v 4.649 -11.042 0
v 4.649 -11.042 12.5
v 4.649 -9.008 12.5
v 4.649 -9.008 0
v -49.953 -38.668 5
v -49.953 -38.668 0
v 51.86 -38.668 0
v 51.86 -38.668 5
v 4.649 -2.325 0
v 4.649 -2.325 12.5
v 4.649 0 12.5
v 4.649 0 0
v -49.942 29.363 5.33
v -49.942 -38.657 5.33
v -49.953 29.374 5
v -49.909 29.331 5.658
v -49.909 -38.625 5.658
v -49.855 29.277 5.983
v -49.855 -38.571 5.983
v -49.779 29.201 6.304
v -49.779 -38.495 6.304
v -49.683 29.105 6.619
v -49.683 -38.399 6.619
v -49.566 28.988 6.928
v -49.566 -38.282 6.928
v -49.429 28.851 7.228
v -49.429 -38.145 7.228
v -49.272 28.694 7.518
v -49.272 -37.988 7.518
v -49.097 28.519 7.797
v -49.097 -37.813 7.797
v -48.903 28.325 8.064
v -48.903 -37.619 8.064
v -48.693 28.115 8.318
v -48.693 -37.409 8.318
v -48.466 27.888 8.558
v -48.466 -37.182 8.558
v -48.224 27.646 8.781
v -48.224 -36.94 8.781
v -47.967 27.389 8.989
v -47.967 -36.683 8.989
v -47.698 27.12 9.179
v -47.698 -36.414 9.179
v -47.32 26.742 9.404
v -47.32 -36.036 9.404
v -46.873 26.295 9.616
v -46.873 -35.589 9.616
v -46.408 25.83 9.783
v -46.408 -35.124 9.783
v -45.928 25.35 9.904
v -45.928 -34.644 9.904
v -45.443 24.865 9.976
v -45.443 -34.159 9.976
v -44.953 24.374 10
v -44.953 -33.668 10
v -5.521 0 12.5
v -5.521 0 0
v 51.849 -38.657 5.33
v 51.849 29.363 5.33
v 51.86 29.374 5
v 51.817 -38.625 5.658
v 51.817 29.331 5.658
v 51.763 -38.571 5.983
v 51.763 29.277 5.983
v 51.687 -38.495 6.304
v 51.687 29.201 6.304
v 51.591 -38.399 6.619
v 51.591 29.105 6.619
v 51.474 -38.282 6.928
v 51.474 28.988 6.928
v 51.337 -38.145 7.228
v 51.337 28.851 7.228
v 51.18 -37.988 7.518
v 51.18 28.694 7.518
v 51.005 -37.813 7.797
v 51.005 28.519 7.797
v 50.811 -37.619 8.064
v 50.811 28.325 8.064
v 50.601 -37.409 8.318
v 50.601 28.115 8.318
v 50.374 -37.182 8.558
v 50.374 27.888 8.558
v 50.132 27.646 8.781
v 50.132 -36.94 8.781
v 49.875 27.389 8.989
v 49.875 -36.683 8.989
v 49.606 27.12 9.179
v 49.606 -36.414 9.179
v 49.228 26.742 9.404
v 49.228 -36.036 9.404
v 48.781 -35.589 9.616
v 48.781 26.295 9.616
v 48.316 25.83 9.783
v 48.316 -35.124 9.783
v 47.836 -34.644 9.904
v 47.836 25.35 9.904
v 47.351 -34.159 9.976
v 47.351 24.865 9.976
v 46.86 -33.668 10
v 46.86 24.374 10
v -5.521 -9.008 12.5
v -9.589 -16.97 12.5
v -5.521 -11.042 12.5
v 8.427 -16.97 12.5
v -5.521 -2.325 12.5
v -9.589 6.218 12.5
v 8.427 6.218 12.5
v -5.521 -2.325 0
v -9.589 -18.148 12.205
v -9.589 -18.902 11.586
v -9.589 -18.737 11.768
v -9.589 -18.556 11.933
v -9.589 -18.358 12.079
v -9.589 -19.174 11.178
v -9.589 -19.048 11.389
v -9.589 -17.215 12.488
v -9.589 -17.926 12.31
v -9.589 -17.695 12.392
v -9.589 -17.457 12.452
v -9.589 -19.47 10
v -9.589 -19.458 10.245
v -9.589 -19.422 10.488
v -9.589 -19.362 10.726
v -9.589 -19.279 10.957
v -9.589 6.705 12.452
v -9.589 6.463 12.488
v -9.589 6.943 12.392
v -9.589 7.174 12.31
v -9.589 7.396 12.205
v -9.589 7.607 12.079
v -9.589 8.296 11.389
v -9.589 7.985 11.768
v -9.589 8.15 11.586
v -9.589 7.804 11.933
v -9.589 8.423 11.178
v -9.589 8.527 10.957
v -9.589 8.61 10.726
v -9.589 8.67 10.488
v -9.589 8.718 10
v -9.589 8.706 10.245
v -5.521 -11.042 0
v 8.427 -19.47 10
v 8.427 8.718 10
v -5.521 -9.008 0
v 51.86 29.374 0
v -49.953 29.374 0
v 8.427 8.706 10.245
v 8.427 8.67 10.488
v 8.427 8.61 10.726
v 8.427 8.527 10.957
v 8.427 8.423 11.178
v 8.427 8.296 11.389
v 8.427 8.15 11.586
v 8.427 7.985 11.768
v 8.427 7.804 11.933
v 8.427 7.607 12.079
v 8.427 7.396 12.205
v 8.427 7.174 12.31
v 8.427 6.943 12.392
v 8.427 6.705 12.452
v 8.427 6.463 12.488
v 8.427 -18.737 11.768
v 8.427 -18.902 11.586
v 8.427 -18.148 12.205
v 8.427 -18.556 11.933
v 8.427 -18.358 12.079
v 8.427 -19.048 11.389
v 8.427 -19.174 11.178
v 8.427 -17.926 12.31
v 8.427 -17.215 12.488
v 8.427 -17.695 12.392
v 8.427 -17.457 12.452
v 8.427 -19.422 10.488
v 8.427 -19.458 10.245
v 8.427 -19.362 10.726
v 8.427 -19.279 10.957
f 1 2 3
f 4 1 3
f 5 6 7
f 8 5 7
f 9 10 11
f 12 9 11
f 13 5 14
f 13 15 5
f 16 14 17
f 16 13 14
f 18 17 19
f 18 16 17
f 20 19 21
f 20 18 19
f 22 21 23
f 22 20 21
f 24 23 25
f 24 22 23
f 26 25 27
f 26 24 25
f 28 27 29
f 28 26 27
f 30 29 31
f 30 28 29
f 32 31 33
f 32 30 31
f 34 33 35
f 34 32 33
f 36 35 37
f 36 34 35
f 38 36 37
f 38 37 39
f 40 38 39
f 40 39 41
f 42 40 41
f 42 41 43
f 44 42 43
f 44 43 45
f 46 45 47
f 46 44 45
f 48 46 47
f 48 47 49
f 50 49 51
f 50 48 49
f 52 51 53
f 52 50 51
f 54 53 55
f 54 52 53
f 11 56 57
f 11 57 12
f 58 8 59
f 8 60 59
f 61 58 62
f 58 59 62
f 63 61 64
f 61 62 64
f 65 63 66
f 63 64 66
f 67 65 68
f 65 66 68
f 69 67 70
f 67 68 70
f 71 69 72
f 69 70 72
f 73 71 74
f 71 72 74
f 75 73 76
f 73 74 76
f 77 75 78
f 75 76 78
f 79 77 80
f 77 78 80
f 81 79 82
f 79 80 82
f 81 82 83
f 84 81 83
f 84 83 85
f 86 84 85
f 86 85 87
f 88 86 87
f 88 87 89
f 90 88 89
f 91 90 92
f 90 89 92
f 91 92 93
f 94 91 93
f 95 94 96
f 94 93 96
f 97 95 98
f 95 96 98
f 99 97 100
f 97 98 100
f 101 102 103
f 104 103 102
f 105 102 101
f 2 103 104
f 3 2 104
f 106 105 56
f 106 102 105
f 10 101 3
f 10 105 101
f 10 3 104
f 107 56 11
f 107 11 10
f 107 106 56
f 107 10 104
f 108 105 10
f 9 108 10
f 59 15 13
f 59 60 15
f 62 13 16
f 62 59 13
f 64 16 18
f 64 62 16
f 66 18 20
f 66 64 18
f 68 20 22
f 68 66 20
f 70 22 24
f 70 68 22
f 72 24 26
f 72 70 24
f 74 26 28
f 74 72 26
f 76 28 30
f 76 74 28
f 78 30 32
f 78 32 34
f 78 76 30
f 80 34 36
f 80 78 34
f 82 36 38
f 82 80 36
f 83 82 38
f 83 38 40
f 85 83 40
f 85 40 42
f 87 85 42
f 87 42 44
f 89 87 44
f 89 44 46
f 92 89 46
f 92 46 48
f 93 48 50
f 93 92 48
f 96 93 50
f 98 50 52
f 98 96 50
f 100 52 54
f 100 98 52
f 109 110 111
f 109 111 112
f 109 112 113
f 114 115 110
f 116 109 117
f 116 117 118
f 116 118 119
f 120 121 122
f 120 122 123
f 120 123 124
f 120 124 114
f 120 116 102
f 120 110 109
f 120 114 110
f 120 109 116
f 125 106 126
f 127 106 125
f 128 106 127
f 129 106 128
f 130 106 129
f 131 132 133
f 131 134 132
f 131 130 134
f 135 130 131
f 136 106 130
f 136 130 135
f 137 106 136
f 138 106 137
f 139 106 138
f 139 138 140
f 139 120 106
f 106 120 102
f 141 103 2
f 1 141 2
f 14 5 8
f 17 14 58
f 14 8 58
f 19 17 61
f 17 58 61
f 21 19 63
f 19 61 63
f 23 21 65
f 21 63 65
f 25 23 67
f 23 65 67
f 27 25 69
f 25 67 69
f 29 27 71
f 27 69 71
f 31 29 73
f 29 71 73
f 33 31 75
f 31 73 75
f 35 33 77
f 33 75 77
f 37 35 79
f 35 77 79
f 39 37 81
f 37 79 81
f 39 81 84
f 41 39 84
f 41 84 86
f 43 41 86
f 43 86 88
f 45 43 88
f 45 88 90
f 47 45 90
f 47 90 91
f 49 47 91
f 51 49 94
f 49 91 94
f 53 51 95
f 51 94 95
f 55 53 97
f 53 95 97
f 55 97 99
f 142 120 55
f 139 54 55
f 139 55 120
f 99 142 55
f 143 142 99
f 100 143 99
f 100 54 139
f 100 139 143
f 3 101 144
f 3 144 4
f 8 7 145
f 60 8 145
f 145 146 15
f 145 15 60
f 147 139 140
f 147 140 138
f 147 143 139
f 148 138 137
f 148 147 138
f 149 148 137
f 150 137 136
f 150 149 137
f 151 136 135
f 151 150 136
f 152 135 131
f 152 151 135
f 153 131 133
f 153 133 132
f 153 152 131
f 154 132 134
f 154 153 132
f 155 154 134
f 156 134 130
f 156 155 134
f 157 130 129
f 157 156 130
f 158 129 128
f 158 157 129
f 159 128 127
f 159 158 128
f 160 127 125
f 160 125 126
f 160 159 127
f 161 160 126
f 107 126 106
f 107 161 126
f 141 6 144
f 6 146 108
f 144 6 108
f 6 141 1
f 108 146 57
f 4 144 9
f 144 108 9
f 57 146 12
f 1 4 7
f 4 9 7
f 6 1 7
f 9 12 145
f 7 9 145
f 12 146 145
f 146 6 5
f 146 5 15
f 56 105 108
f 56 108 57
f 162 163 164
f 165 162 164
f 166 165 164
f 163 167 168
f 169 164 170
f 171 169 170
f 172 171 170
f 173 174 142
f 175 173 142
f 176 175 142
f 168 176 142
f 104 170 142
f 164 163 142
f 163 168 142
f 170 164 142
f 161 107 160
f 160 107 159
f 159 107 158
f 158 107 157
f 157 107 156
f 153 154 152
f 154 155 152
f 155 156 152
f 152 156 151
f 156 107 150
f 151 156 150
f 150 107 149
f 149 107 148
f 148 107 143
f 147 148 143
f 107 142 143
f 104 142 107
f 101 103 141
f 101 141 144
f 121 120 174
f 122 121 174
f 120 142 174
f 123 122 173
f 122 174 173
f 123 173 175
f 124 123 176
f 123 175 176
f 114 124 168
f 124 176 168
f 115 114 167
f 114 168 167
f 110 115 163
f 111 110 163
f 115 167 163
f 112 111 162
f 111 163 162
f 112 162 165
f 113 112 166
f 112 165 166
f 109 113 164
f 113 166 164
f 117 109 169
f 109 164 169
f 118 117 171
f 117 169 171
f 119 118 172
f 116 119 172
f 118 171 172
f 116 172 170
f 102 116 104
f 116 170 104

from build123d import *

# Parameters (mm, degrees)
F0_W     = 101.8128246069
F0_H     = 68.0426731706
F1_DEPTH = 10
F2_R     = 5
F3_W     = 18.016605638
F3_H     = 28.1872702762
F4_DEPTH = 2.5
F5_W     = 10.1706655696
F5_H     = 2.0341333002
F5_H_2   = 2.3247234058
F6_DEPTH = 25
F7_R     = 2.49999


# Not quite as in the source:
# - a fillet or chamfer is up to 0.001 mm smaller than in the source, because OpenCascade refuses the exact size


with BuildPart() as f1:
    # F0 (on Top) → F1 (new body)
    with BuildSketch(Plane.XY):
        with Locations((0.9539090097, -4.6469829977)):
            Rectangle(F0_W, F0_H)
    extrude(amount=F1_DEPTH)

    # F2
    f2_edges = [f1.edges().sort_by_distance(p)[0] for p in [
        (-49.952503, -4.646983, 10),
        (0.953909, 29.374354, 10),
        (0.953909, -38.66832, 10),
        (51.860321, -4.646983, 10),
    ]]
    fillet(f2_edges, radius=F2_R)

    # F3 (on face) → F4 (join)
    with BuildSketch(Plane.XY.offset(10)):
        with Locations((-0.5811811425, -5.3759221919)):
            Rectangle(F3_W, F3_H)
    extrude(amount=F4_DEPTH)

    # F5 (on face) → F6 (cut)
    with BuildSketch(Plane.XY.offset(12.5)):
        with Locations((-0.435885042, -10.0253690034)):
            Rectangle(F5_W, F5_H)
        with Locations((-0.435885042, -1.1623617029)):
            Rectangle(F5_W, F5_H_2)
    extrude(amount=-F6_DEPTH, mode=Mode.SUBTRACT)

    # F7 (radius 2.5 in the source; OpenCascade refuses exactly that, so slightly less here)
    f7_edges = [f1.edges().sort_by_distance(p)[0] for p in [
        (-0.581181, -19.469557, 12.5),
        (-0.581181, 8.717713, 12.5),
    ]]
    fillet(f7_edges, radius=F7_R)


solid = f1.part
